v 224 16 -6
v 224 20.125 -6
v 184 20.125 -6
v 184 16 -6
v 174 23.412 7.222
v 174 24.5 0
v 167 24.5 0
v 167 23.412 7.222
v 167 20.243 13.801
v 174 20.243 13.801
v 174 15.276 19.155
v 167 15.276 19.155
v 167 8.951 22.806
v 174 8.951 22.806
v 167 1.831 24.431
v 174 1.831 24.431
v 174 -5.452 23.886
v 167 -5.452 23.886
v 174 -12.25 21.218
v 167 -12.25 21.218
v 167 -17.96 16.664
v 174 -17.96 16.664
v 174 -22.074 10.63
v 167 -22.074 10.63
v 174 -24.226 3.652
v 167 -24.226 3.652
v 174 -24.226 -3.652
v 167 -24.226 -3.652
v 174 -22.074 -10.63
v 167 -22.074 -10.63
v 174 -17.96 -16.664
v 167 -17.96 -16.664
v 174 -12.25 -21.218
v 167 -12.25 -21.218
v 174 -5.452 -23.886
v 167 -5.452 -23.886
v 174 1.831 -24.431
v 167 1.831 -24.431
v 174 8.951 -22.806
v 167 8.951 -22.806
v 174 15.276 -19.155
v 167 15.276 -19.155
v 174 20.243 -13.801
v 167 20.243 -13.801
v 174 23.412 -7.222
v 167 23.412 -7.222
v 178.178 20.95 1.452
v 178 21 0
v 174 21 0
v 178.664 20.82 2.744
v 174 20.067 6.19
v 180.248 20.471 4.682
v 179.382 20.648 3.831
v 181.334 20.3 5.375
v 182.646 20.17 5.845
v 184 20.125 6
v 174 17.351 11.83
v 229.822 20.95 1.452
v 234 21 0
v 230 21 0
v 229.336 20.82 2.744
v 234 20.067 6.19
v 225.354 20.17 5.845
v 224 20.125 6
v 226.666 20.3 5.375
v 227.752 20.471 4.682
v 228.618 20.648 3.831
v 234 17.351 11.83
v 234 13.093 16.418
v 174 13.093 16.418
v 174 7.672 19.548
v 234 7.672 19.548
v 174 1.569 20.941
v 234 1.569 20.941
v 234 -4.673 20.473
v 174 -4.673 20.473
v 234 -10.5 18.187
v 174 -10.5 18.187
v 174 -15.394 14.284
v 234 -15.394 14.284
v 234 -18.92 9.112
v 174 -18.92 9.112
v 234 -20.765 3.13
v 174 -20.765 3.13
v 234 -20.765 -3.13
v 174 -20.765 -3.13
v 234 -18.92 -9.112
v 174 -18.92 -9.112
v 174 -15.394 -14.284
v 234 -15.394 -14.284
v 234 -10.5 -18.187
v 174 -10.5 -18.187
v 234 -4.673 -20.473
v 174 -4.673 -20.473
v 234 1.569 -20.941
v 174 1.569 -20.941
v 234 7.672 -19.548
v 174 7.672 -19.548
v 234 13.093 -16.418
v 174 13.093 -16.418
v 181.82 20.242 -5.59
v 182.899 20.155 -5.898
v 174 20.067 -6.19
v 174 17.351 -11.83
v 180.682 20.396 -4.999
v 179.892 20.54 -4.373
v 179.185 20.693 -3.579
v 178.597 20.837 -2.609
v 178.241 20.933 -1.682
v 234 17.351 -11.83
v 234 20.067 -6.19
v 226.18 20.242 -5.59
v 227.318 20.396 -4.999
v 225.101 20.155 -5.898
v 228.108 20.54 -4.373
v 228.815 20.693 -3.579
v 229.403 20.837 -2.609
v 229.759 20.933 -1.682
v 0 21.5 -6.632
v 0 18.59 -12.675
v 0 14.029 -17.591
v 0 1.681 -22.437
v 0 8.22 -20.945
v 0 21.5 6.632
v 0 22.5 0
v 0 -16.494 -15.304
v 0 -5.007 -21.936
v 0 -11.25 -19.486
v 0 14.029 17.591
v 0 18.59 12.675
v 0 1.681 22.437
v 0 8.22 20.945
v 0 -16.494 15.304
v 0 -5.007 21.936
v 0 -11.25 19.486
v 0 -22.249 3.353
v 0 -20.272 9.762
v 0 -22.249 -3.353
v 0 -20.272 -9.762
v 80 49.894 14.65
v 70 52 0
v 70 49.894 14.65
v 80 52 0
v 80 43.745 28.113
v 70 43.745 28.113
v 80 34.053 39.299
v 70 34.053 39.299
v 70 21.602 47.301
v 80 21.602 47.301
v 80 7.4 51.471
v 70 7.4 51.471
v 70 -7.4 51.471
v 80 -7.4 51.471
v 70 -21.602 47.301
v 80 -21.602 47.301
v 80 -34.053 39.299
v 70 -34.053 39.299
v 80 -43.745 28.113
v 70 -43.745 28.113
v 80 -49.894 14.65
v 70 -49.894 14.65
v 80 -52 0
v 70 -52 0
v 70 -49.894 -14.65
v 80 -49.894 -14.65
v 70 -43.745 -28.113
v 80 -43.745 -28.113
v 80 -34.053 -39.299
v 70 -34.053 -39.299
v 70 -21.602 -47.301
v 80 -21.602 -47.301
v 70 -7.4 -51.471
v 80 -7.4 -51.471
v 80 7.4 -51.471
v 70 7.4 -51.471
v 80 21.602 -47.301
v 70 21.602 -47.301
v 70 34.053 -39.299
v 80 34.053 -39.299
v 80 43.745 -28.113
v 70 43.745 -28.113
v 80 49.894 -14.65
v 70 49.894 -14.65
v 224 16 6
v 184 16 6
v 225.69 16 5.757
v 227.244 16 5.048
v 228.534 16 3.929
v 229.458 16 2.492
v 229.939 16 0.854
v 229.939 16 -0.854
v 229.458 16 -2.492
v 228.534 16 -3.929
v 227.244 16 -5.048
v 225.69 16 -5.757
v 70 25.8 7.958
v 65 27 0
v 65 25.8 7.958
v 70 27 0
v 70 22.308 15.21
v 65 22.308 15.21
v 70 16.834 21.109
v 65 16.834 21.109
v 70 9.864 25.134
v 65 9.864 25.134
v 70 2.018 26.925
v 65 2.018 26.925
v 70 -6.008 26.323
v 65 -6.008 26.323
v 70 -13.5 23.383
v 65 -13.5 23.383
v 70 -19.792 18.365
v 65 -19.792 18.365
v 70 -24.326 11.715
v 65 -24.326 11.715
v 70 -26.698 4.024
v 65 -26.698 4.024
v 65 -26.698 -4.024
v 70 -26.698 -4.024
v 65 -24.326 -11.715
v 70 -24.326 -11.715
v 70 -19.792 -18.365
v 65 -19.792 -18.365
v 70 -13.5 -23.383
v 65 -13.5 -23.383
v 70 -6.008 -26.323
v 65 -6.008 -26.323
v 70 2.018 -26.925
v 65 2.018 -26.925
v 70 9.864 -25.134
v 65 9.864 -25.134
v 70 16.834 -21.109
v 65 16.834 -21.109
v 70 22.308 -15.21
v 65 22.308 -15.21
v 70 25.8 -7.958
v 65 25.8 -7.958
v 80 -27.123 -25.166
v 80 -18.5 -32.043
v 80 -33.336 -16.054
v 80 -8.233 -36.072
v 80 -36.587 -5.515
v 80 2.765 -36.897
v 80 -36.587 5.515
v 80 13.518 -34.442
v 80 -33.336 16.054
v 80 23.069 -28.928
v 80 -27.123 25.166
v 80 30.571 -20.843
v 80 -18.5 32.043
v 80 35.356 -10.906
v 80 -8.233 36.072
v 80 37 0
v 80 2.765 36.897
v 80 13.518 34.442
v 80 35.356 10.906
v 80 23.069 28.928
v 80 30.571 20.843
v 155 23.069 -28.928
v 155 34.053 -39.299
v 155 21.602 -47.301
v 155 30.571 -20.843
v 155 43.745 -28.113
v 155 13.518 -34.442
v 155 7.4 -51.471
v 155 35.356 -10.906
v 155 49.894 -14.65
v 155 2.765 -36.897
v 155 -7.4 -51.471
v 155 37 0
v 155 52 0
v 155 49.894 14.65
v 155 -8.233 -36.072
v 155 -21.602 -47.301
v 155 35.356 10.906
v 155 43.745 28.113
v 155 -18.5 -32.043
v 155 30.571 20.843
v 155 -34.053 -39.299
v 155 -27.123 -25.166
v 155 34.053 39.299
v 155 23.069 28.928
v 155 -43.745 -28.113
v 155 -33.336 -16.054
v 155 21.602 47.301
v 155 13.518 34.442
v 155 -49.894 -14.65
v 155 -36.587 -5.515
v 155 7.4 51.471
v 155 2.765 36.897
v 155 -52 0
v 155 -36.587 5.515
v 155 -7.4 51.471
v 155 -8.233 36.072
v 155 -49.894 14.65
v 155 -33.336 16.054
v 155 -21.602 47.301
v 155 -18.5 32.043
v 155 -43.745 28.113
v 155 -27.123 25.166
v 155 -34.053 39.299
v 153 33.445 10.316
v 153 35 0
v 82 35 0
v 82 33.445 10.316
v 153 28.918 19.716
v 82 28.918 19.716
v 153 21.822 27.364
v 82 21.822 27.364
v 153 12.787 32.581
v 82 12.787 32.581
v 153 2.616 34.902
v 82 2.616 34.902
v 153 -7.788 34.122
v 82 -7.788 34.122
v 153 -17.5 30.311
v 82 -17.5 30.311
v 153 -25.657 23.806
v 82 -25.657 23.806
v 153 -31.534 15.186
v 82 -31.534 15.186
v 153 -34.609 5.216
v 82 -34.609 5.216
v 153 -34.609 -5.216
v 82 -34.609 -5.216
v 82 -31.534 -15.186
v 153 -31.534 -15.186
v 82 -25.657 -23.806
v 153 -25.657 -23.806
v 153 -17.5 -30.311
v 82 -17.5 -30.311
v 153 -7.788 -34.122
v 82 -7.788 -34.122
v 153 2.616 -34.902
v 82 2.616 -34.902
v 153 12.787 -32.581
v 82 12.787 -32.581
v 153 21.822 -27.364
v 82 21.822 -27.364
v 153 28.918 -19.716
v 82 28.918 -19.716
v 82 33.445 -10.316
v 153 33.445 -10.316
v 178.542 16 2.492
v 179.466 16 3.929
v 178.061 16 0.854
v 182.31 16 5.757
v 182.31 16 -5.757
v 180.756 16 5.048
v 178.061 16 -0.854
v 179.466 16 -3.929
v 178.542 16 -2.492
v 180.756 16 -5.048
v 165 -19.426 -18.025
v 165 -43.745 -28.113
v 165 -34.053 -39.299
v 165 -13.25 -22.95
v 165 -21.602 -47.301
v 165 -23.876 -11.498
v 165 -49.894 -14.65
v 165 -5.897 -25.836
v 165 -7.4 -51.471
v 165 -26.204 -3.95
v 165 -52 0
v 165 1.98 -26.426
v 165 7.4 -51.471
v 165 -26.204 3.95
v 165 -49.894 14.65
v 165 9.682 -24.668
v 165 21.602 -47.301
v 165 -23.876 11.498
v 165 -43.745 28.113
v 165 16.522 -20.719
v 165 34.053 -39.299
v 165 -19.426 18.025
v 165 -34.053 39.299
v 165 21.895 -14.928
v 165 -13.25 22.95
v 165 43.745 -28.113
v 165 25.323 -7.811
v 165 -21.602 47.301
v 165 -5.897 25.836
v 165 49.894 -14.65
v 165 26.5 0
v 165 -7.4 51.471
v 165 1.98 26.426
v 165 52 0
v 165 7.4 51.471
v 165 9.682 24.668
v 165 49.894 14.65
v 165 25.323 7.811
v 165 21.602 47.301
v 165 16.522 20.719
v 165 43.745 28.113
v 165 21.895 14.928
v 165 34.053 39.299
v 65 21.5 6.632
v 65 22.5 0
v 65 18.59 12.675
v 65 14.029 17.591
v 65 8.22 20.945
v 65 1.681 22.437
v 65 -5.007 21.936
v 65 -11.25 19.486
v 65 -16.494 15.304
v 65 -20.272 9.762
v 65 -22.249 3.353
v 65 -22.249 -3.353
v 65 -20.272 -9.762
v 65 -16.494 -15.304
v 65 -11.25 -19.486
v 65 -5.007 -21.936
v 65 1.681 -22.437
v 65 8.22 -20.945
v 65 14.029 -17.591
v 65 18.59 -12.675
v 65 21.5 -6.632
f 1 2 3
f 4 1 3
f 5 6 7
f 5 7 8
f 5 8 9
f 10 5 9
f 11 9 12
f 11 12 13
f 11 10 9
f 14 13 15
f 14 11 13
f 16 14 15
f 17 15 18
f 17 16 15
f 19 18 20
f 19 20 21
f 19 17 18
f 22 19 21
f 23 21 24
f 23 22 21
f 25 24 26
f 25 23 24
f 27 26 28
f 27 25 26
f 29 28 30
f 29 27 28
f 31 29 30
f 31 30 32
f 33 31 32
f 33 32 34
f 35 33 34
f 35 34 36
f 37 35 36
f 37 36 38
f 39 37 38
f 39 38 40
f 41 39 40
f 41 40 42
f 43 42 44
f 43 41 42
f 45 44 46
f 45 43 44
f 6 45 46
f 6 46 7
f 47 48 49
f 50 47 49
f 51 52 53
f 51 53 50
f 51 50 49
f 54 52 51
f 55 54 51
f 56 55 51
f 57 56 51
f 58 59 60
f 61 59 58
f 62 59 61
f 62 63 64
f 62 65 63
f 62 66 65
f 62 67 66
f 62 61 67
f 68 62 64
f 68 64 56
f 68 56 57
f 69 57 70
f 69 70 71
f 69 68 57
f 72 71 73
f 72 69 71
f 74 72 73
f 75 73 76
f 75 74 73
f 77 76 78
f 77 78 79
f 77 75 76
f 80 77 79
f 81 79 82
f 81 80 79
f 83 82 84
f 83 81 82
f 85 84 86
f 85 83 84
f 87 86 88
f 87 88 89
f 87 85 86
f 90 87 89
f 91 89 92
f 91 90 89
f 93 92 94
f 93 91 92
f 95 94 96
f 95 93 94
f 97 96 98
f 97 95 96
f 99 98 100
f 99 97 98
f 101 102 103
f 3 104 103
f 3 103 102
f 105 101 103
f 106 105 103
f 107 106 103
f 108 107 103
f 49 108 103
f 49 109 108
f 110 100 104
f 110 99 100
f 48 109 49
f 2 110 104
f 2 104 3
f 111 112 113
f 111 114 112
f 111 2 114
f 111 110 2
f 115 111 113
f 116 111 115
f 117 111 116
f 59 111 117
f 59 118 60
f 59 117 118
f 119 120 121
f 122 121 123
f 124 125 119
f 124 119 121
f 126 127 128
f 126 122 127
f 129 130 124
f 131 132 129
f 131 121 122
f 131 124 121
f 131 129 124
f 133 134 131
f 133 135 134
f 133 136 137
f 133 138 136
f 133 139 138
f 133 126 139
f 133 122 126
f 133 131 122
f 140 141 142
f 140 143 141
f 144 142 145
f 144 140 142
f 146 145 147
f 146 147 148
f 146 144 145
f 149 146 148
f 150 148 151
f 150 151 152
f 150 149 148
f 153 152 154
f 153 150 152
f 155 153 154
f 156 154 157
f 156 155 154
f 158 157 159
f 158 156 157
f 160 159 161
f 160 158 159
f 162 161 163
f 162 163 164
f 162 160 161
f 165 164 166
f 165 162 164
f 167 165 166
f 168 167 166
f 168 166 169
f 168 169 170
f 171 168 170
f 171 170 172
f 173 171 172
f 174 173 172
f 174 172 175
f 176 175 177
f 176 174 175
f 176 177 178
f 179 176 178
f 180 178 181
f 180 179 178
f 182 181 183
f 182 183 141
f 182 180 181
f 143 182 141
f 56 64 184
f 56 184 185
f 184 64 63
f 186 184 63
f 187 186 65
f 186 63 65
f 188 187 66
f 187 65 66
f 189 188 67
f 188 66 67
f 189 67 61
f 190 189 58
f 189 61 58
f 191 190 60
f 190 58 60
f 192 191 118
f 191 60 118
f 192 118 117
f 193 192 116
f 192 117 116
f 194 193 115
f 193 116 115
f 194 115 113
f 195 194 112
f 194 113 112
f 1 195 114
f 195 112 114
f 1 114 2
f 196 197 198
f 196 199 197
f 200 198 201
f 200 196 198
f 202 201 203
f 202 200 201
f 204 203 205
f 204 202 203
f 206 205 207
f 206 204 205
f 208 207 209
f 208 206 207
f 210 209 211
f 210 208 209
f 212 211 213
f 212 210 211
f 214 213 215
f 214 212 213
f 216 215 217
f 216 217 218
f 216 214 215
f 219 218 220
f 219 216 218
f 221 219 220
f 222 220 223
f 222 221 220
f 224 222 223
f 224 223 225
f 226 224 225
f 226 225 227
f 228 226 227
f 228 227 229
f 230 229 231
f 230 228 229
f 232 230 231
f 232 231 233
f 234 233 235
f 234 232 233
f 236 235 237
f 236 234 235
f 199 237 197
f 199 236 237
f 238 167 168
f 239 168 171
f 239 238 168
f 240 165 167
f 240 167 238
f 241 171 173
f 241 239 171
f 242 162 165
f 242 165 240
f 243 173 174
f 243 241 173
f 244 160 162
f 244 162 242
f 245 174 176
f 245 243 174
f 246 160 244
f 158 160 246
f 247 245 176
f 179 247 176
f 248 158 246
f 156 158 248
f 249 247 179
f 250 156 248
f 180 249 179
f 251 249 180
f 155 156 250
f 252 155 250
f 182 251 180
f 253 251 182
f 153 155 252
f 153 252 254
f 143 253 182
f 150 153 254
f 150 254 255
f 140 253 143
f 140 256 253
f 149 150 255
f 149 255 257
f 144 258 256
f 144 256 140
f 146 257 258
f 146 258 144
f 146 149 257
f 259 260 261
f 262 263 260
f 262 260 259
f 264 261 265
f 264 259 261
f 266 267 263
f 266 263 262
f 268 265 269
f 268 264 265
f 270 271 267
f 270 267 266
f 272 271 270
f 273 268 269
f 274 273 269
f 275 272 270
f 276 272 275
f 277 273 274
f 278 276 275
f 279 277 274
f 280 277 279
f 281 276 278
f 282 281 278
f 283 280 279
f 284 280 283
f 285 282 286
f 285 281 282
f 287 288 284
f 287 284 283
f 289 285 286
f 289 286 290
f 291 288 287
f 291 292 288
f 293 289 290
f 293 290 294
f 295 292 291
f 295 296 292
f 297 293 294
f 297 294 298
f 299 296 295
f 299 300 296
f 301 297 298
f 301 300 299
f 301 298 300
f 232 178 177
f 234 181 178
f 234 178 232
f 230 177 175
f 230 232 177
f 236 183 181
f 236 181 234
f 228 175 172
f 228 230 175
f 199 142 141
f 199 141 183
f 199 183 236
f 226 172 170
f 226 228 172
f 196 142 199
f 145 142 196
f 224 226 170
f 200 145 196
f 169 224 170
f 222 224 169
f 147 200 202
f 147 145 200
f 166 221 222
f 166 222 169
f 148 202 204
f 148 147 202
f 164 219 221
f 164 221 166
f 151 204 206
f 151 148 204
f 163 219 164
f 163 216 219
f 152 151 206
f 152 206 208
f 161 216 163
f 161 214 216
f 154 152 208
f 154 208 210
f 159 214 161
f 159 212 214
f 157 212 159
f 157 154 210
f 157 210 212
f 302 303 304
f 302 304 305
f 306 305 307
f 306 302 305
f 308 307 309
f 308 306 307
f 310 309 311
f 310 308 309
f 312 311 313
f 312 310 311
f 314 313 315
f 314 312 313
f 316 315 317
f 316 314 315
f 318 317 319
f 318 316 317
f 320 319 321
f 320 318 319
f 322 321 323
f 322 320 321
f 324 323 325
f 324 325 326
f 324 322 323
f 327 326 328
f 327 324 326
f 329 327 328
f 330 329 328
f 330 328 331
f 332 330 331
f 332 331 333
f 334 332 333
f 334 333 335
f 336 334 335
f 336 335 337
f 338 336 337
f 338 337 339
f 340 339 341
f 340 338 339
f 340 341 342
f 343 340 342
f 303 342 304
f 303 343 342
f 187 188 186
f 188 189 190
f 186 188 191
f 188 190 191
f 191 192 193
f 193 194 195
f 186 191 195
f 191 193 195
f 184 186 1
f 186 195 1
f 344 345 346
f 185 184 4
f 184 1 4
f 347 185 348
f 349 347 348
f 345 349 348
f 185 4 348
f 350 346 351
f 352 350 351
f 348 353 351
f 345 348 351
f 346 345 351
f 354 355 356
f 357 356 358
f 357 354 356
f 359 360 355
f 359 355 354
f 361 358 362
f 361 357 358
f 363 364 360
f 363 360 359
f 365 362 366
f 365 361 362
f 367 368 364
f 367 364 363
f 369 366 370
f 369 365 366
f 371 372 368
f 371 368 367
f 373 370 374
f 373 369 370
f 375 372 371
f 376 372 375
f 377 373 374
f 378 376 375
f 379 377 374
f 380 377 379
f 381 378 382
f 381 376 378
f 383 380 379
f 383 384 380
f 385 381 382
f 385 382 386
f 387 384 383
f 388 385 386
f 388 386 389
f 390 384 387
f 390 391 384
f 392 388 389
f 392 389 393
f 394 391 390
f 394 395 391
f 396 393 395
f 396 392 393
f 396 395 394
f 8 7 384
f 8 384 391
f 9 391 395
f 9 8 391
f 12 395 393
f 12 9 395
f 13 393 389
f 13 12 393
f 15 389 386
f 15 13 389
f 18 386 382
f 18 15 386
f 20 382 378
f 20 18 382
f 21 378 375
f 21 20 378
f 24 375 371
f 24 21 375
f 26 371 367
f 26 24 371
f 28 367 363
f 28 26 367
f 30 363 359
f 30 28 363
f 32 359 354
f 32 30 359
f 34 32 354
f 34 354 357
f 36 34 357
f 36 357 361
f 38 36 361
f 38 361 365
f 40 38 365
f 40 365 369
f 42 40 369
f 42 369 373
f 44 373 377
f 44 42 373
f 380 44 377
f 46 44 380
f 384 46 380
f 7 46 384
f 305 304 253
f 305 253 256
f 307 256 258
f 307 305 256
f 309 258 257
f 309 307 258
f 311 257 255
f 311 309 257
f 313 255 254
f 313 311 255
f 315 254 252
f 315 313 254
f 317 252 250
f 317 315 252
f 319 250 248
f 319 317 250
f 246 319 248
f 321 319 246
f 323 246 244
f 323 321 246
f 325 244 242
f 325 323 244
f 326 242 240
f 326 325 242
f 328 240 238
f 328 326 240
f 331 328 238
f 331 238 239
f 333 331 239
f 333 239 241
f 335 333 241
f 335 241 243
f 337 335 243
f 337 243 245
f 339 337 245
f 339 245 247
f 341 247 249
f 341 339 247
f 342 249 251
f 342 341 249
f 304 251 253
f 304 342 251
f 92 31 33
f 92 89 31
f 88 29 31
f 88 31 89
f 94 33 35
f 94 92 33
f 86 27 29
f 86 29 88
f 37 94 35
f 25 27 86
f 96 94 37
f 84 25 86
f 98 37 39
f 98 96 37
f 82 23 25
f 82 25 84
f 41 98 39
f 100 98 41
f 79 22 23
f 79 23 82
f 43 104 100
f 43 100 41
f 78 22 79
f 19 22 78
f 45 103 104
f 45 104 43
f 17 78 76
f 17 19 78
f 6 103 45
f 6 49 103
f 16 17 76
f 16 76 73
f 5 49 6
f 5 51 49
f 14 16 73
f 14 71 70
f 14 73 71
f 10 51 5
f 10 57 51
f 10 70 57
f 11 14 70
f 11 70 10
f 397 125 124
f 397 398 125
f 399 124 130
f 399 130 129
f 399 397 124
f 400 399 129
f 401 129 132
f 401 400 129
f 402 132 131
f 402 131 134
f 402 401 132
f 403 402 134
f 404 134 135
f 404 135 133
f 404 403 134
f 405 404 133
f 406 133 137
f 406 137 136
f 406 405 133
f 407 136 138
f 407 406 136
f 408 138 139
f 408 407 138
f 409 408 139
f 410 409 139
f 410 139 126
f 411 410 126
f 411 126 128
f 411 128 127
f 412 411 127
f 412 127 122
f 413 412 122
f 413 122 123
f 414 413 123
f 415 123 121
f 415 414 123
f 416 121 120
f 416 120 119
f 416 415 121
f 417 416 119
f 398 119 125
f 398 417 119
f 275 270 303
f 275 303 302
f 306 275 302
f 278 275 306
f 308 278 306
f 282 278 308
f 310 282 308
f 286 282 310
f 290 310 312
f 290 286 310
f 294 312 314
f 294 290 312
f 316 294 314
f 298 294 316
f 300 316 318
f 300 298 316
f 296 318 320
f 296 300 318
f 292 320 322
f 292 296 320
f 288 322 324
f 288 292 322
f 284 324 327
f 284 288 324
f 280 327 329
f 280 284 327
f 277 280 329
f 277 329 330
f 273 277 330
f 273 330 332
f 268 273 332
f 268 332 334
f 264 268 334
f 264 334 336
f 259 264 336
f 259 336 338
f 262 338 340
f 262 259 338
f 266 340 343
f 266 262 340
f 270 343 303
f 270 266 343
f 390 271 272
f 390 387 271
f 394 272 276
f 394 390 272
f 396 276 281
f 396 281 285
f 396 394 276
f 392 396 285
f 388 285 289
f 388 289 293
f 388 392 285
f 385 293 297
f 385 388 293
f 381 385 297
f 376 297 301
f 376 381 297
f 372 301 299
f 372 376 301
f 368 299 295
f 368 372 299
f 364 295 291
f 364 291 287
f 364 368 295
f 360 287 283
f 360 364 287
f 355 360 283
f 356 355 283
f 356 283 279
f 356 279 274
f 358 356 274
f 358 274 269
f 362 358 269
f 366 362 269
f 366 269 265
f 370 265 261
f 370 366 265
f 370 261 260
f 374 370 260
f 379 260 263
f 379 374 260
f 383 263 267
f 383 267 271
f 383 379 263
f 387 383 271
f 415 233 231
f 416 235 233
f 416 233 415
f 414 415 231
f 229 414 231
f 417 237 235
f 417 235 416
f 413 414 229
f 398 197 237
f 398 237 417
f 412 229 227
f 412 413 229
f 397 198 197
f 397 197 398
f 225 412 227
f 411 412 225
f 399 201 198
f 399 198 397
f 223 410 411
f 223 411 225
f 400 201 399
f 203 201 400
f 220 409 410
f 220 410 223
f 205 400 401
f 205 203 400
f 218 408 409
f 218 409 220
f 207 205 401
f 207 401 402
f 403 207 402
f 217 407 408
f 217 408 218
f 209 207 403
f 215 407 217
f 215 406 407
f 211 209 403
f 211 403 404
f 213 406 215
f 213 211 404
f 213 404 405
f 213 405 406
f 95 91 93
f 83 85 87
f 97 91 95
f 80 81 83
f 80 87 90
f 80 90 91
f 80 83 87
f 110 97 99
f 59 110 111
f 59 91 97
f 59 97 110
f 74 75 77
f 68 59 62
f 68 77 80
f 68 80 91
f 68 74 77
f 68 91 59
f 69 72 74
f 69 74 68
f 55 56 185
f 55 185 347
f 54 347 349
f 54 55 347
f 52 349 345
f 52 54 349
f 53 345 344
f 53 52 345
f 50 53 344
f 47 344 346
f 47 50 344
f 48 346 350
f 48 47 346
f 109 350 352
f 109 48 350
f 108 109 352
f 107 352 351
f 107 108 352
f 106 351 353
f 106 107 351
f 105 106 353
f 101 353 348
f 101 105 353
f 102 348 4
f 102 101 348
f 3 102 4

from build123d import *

# Parameters (mm, degrees)
CHAMFER1_SIZE      = 2
CUT_EXTRUDE1_DEPTH = 5


with BuildPart() as part:
    # Sketch1 → Revolve1 (revolve)
    with BuildSketch(Plane.XY):
        Polygon((0, 0), (0, 22.5), (65, 22.5), (65, 27), (70, 27), (70, 52), (80, 52), (80, 35), (155, 35), (155, 52), (165, 52), (165, 24.5), (174, 24.5), (174, 21), (234, 21), (234, 0), align=None)
    revolve(axis=Axis((0, 0, 0), (1, 0, 0)))

    # Chamfer1
    chamfer1_edges = [part.edges().sort_by_distance(p)[0] for p in [
        (165, -24.5, 0),
        (155, -35, 0),
        (80, -35, 0),
    ]]
    chamfer(chamfer1_edges, length=CHAMFER1_SIZE)

    # Sketch2 → Cut-Extrude1 (cut)
    with BuildSketch(Plane(origin=(0, 21, 0), x_dir=(1, 0, 0), z_dir=(0, 1, 0))):
        with BuildLine():
            Line((204, 6), (204, -6))
            Line((204, -6), (184, -6))
            ThreePointArc((184, -6), (178, 0), (184, 6))
            Line((184, 6), (204, 6))
        make_face()
    cut_extrude1 = extrude(amount=-CUT_EXTRUDE1_DEPTH, mode=Mode.SUBTRACT)

    # Mirror1: Cut-Extrude1 across plane
    add(cut_extrude1.mirror(Plane(origin=(204, 16, -6), x_dir=(0, 0, 1), z_dir=(1, 0, 0))), mode=Mode.SUBTRACT)


solid = part.part
